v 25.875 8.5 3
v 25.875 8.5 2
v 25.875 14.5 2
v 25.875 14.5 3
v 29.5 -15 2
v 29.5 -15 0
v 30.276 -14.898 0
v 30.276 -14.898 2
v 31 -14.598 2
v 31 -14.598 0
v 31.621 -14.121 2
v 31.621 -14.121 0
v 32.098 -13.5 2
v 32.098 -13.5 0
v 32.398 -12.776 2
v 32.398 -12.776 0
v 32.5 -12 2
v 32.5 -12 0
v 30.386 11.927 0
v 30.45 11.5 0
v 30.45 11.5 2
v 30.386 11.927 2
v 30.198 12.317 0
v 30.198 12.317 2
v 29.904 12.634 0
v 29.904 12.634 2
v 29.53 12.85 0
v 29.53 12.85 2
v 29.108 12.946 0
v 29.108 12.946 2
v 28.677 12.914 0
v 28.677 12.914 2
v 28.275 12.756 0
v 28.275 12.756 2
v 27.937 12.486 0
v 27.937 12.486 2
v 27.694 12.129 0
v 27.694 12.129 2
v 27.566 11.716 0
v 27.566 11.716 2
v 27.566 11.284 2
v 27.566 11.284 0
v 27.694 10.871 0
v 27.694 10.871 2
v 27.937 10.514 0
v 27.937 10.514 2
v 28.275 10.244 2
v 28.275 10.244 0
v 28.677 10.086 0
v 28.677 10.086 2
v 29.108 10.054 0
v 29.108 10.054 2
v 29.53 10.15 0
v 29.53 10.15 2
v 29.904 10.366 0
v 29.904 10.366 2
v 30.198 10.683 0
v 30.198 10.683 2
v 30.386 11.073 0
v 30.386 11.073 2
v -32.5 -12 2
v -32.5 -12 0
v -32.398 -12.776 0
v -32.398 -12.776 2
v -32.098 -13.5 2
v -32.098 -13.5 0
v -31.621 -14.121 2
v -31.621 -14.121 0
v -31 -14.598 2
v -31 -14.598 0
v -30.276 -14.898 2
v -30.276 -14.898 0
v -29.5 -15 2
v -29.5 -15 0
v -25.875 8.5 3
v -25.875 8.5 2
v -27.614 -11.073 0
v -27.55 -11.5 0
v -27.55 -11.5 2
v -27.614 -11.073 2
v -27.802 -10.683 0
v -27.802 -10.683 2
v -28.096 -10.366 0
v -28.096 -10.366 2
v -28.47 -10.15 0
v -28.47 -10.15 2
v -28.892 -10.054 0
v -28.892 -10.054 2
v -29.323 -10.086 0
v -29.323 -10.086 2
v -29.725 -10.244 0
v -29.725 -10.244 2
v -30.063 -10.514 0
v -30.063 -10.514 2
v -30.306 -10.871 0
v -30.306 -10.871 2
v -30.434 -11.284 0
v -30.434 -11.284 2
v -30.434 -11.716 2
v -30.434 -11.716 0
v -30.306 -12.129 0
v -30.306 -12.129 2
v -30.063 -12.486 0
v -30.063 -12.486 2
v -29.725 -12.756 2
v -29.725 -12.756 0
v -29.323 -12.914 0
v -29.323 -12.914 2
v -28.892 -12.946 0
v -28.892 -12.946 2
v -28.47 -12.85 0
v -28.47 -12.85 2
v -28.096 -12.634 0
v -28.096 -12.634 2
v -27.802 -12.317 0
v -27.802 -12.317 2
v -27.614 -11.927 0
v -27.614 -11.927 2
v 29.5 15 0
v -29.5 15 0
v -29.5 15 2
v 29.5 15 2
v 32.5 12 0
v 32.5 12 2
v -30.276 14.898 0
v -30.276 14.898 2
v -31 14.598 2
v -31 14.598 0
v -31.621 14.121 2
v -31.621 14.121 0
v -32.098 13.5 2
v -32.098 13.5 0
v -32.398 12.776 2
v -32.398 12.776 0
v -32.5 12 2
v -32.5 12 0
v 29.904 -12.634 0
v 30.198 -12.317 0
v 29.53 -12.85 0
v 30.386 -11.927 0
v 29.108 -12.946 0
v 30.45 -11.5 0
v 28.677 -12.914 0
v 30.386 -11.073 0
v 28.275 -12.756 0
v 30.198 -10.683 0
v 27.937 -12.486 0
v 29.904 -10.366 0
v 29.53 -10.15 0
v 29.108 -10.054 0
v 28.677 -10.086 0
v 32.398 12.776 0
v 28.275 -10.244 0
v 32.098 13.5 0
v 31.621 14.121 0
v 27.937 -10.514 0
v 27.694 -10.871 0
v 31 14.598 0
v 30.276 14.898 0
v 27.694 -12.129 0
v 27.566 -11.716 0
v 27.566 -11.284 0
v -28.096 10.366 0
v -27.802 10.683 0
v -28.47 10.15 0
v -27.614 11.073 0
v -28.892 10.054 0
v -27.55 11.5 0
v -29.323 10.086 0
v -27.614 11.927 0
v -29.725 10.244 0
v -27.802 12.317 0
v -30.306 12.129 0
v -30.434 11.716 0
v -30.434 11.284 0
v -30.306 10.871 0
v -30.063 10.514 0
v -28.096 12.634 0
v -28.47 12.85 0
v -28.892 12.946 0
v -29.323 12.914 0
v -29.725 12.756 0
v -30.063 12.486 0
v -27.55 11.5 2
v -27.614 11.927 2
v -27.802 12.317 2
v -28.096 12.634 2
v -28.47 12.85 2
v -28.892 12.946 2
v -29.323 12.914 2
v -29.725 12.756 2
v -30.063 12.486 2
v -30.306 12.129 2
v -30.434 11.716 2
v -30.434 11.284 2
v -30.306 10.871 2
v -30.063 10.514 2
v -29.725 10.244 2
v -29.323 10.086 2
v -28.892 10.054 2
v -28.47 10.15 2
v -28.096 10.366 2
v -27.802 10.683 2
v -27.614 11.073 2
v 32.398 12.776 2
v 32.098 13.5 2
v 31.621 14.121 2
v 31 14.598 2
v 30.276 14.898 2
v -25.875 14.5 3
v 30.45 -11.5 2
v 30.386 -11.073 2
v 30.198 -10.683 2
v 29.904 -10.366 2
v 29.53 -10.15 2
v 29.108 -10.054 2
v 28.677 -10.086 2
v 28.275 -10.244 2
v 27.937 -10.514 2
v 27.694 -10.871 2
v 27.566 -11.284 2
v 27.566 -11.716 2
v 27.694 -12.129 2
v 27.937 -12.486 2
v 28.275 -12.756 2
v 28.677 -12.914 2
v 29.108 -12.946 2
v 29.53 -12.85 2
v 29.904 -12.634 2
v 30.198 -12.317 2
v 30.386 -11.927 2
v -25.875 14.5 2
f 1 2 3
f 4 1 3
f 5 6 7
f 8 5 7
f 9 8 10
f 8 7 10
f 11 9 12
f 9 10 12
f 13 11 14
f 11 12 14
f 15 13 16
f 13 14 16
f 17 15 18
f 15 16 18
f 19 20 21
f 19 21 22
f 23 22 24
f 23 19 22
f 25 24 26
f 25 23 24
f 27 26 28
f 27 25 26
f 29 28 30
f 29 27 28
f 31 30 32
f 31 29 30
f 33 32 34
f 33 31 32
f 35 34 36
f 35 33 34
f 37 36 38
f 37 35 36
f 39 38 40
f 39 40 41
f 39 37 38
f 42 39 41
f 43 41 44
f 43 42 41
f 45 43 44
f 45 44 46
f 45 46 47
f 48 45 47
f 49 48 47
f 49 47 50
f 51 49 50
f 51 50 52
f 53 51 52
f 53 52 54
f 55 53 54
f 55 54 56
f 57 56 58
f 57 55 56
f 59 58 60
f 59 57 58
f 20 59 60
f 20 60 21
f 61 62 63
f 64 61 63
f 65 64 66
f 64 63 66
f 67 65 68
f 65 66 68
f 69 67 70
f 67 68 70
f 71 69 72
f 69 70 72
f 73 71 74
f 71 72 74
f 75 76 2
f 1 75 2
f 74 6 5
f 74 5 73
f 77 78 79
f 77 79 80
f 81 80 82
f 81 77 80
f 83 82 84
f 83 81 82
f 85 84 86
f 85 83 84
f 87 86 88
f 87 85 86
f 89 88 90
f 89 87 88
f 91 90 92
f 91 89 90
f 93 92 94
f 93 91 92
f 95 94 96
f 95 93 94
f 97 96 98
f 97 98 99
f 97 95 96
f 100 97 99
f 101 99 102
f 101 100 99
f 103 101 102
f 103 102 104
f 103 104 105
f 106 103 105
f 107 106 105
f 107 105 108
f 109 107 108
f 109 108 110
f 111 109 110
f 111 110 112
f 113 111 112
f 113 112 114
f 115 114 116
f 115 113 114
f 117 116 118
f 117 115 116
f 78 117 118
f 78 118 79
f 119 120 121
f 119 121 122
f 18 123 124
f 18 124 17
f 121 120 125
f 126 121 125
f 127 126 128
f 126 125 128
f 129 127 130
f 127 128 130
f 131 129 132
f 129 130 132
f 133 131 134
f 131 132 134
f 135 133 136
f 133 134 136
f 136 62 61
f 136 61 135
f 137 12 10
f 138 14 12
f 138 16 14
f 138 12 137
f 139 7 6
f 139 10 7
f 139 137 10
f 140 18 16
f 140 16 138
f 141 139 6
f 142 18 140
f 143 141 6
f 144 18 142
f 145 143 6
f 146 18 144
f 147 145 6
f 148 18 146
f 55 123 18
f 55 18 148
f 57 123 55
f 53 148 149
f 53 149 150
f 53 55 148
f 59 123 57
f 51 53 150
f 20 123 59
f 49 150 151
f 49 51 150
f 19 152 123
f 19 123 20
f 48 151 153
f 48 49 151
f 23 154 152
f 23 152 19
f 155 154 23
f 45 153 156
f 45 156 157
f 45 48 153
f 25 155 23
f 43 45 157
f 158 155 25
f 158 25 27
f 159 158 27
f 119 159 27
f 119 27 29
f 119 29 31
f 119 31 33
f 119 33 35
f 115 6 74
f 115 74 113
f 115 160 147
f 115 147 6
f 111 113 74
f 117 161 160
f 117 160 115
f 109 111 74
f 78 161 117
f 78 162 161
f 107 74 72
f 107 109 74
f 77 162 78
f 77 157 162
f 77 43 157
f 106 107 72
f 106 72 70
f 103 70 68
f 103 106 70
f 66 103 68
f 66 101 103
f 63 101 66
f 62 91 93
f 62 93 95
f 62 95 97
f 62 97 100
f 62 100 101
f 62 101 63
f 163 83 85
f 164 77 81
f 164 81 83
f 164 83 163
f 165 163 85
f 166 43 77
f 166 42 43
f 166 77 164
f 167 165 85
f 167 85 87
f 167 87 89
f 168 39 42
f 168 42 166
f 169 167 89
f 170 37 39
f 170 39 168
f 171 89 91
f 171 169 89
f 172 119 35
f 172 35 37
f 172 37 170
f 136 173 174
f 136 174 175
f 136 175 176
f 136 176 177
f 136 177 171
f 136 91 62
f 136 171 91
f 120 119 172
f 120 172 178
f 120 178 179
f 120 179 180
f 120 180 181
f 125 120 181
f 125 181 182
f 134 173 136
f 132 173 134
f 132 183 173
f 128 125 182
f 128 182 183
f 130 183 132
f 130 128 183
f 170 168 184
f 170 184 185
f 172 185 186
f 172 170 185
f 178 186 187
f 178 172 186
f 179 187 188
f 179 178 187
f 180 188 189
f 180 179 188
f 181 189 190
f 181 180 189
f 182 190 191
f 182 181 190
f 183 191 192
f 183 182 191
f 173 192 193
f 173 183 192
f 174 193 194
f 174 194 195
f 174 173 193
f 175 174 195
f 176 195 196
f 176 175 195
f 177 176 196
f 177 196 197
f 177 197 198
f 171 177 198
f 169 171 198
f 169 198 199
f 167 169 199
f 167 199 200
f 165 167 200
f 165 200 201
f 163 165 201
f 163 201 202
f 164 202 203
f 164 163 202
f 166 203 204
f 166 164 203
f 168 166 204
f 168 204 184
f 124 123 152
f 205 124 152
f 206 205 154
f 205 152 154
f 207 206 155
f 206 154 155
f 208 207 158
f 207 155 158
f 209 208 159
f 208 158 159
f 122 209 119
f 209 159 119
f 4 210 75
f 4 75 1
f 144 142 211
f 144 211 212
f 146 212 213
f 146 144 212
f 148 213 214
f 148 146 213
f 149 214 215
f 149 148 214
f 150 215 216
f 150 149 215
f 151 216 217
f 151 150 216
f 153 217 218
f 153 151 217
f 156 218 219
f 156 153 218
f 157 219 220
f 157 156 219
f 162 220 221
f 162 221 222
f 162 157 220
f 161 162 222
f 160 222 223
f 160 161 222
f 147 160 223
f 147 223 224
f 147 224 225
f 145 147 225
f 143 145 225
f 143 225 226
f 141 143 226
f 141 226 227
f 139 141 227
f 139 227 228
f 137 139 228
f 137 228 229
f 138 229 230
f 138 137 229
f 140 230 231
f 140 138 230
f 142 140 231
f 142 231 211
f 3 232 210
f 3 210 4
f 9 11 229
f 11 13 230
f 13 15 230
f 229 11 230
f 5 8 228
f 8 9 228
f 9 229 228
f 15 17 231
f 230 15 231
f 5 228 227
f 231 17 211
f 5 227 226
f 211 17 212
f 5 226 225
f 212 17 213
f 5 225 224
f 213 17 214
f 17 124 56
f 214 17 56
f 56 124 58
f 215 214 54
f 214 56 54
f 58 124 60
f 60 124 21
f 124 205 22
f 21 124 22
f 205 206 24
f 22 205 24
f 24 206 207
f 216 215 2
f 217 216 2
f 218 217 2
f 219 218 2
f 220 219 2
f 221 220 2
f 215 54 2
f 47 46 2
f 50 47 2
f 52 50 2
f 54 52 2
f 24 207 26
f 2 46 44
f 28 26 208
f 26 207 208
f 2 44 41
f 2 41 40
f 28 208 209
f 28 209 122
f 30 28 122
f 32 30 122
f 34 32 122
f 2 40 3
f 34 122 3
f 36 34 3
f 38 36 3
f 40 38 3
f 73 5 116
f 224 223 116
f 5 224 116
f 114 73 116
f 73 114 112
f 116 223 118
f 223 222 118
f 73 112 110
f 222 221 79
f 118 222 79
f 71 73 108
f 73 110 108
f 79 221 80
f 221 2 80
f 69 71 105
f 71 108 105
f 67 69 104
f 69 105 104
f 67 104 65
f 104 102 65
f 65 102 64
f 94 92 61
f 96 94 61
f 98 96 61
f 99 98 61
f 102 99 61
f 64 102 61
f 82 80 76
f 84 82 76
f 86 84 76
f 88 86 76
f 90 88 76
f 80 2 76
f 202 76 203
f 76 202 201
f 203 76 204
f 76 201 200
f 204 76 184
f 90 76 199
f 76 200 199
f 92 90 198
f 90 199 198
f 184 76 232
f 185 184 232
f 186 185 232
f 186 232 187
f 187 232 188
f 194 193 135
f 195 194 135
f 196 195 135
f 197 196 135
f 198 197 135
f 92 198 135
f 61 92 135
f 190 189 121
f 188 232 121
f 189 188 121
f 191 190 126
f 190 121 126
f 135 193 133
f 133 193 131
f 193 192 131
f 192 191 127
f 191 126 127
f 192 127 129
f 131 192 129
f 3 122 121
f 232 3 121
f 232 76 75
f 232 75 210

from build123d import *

# Parameters (mm, degrees)
SKETCH_R     = 1.45
PAD_DEPTH    = 2
SKETCH001_W  = 51.75
SKETCH001_H  = 6
PAD001_DEPTH = 1


with BuildPart() as part:
    # Sketch → Pad (new body)
    with BuildSketch(Plane.XY):
        with BuildLine():
            Line((-29.5, 15), (29.5, 15))
            ThreePointArc((32.5, 12), (31.62132, 14.12132), (29.5, 15))
            Line((32.5, 12), (32.5, -12))
            ThreePointArc((29.5, -15), (31.62132, -14.12132), (32.5, -12))
            Line((29.5, -15), (-29.5, -15))
            ThreePointArc((-32.5, -12), (-31.62132, -14.12132), (-29.5, -15))
            Line((-32.5, -12), (-32.5, 12))
            ThreePointArc((-29.5, 15), (-31.62132, 14.12132), (-32.5, 12))
        make_face()
        with Locations((-29, 11.5)):
            Circle(SKETCH_R, mode=Mode.SUBTRACT)
        with Locations((29, 11.5)):
            Circle(SKETCH_R, mode=Mode.SUBTRACT)
        with Locations((-29, -11.5)):
            Circle(SKETCH_R, mode=Mode.SUBTRACT)
        with Locations((29, -11.5)):
            Circle(SKETCH_R, mode=Mode.SUBTRACT)
    extrude(amount=PAD_DEPTH)

    # Sketch001 (on Face14 of Pad) → Pad001 (join)
    with BuildSketch(Plane.XY.offset(2)):
        with Locations((0, 11.5)):
            Rectangle(SKETCH001_W, SKETCH001_H)
    extrude(amount=PAD001_DEPTH)


solid = part.part
